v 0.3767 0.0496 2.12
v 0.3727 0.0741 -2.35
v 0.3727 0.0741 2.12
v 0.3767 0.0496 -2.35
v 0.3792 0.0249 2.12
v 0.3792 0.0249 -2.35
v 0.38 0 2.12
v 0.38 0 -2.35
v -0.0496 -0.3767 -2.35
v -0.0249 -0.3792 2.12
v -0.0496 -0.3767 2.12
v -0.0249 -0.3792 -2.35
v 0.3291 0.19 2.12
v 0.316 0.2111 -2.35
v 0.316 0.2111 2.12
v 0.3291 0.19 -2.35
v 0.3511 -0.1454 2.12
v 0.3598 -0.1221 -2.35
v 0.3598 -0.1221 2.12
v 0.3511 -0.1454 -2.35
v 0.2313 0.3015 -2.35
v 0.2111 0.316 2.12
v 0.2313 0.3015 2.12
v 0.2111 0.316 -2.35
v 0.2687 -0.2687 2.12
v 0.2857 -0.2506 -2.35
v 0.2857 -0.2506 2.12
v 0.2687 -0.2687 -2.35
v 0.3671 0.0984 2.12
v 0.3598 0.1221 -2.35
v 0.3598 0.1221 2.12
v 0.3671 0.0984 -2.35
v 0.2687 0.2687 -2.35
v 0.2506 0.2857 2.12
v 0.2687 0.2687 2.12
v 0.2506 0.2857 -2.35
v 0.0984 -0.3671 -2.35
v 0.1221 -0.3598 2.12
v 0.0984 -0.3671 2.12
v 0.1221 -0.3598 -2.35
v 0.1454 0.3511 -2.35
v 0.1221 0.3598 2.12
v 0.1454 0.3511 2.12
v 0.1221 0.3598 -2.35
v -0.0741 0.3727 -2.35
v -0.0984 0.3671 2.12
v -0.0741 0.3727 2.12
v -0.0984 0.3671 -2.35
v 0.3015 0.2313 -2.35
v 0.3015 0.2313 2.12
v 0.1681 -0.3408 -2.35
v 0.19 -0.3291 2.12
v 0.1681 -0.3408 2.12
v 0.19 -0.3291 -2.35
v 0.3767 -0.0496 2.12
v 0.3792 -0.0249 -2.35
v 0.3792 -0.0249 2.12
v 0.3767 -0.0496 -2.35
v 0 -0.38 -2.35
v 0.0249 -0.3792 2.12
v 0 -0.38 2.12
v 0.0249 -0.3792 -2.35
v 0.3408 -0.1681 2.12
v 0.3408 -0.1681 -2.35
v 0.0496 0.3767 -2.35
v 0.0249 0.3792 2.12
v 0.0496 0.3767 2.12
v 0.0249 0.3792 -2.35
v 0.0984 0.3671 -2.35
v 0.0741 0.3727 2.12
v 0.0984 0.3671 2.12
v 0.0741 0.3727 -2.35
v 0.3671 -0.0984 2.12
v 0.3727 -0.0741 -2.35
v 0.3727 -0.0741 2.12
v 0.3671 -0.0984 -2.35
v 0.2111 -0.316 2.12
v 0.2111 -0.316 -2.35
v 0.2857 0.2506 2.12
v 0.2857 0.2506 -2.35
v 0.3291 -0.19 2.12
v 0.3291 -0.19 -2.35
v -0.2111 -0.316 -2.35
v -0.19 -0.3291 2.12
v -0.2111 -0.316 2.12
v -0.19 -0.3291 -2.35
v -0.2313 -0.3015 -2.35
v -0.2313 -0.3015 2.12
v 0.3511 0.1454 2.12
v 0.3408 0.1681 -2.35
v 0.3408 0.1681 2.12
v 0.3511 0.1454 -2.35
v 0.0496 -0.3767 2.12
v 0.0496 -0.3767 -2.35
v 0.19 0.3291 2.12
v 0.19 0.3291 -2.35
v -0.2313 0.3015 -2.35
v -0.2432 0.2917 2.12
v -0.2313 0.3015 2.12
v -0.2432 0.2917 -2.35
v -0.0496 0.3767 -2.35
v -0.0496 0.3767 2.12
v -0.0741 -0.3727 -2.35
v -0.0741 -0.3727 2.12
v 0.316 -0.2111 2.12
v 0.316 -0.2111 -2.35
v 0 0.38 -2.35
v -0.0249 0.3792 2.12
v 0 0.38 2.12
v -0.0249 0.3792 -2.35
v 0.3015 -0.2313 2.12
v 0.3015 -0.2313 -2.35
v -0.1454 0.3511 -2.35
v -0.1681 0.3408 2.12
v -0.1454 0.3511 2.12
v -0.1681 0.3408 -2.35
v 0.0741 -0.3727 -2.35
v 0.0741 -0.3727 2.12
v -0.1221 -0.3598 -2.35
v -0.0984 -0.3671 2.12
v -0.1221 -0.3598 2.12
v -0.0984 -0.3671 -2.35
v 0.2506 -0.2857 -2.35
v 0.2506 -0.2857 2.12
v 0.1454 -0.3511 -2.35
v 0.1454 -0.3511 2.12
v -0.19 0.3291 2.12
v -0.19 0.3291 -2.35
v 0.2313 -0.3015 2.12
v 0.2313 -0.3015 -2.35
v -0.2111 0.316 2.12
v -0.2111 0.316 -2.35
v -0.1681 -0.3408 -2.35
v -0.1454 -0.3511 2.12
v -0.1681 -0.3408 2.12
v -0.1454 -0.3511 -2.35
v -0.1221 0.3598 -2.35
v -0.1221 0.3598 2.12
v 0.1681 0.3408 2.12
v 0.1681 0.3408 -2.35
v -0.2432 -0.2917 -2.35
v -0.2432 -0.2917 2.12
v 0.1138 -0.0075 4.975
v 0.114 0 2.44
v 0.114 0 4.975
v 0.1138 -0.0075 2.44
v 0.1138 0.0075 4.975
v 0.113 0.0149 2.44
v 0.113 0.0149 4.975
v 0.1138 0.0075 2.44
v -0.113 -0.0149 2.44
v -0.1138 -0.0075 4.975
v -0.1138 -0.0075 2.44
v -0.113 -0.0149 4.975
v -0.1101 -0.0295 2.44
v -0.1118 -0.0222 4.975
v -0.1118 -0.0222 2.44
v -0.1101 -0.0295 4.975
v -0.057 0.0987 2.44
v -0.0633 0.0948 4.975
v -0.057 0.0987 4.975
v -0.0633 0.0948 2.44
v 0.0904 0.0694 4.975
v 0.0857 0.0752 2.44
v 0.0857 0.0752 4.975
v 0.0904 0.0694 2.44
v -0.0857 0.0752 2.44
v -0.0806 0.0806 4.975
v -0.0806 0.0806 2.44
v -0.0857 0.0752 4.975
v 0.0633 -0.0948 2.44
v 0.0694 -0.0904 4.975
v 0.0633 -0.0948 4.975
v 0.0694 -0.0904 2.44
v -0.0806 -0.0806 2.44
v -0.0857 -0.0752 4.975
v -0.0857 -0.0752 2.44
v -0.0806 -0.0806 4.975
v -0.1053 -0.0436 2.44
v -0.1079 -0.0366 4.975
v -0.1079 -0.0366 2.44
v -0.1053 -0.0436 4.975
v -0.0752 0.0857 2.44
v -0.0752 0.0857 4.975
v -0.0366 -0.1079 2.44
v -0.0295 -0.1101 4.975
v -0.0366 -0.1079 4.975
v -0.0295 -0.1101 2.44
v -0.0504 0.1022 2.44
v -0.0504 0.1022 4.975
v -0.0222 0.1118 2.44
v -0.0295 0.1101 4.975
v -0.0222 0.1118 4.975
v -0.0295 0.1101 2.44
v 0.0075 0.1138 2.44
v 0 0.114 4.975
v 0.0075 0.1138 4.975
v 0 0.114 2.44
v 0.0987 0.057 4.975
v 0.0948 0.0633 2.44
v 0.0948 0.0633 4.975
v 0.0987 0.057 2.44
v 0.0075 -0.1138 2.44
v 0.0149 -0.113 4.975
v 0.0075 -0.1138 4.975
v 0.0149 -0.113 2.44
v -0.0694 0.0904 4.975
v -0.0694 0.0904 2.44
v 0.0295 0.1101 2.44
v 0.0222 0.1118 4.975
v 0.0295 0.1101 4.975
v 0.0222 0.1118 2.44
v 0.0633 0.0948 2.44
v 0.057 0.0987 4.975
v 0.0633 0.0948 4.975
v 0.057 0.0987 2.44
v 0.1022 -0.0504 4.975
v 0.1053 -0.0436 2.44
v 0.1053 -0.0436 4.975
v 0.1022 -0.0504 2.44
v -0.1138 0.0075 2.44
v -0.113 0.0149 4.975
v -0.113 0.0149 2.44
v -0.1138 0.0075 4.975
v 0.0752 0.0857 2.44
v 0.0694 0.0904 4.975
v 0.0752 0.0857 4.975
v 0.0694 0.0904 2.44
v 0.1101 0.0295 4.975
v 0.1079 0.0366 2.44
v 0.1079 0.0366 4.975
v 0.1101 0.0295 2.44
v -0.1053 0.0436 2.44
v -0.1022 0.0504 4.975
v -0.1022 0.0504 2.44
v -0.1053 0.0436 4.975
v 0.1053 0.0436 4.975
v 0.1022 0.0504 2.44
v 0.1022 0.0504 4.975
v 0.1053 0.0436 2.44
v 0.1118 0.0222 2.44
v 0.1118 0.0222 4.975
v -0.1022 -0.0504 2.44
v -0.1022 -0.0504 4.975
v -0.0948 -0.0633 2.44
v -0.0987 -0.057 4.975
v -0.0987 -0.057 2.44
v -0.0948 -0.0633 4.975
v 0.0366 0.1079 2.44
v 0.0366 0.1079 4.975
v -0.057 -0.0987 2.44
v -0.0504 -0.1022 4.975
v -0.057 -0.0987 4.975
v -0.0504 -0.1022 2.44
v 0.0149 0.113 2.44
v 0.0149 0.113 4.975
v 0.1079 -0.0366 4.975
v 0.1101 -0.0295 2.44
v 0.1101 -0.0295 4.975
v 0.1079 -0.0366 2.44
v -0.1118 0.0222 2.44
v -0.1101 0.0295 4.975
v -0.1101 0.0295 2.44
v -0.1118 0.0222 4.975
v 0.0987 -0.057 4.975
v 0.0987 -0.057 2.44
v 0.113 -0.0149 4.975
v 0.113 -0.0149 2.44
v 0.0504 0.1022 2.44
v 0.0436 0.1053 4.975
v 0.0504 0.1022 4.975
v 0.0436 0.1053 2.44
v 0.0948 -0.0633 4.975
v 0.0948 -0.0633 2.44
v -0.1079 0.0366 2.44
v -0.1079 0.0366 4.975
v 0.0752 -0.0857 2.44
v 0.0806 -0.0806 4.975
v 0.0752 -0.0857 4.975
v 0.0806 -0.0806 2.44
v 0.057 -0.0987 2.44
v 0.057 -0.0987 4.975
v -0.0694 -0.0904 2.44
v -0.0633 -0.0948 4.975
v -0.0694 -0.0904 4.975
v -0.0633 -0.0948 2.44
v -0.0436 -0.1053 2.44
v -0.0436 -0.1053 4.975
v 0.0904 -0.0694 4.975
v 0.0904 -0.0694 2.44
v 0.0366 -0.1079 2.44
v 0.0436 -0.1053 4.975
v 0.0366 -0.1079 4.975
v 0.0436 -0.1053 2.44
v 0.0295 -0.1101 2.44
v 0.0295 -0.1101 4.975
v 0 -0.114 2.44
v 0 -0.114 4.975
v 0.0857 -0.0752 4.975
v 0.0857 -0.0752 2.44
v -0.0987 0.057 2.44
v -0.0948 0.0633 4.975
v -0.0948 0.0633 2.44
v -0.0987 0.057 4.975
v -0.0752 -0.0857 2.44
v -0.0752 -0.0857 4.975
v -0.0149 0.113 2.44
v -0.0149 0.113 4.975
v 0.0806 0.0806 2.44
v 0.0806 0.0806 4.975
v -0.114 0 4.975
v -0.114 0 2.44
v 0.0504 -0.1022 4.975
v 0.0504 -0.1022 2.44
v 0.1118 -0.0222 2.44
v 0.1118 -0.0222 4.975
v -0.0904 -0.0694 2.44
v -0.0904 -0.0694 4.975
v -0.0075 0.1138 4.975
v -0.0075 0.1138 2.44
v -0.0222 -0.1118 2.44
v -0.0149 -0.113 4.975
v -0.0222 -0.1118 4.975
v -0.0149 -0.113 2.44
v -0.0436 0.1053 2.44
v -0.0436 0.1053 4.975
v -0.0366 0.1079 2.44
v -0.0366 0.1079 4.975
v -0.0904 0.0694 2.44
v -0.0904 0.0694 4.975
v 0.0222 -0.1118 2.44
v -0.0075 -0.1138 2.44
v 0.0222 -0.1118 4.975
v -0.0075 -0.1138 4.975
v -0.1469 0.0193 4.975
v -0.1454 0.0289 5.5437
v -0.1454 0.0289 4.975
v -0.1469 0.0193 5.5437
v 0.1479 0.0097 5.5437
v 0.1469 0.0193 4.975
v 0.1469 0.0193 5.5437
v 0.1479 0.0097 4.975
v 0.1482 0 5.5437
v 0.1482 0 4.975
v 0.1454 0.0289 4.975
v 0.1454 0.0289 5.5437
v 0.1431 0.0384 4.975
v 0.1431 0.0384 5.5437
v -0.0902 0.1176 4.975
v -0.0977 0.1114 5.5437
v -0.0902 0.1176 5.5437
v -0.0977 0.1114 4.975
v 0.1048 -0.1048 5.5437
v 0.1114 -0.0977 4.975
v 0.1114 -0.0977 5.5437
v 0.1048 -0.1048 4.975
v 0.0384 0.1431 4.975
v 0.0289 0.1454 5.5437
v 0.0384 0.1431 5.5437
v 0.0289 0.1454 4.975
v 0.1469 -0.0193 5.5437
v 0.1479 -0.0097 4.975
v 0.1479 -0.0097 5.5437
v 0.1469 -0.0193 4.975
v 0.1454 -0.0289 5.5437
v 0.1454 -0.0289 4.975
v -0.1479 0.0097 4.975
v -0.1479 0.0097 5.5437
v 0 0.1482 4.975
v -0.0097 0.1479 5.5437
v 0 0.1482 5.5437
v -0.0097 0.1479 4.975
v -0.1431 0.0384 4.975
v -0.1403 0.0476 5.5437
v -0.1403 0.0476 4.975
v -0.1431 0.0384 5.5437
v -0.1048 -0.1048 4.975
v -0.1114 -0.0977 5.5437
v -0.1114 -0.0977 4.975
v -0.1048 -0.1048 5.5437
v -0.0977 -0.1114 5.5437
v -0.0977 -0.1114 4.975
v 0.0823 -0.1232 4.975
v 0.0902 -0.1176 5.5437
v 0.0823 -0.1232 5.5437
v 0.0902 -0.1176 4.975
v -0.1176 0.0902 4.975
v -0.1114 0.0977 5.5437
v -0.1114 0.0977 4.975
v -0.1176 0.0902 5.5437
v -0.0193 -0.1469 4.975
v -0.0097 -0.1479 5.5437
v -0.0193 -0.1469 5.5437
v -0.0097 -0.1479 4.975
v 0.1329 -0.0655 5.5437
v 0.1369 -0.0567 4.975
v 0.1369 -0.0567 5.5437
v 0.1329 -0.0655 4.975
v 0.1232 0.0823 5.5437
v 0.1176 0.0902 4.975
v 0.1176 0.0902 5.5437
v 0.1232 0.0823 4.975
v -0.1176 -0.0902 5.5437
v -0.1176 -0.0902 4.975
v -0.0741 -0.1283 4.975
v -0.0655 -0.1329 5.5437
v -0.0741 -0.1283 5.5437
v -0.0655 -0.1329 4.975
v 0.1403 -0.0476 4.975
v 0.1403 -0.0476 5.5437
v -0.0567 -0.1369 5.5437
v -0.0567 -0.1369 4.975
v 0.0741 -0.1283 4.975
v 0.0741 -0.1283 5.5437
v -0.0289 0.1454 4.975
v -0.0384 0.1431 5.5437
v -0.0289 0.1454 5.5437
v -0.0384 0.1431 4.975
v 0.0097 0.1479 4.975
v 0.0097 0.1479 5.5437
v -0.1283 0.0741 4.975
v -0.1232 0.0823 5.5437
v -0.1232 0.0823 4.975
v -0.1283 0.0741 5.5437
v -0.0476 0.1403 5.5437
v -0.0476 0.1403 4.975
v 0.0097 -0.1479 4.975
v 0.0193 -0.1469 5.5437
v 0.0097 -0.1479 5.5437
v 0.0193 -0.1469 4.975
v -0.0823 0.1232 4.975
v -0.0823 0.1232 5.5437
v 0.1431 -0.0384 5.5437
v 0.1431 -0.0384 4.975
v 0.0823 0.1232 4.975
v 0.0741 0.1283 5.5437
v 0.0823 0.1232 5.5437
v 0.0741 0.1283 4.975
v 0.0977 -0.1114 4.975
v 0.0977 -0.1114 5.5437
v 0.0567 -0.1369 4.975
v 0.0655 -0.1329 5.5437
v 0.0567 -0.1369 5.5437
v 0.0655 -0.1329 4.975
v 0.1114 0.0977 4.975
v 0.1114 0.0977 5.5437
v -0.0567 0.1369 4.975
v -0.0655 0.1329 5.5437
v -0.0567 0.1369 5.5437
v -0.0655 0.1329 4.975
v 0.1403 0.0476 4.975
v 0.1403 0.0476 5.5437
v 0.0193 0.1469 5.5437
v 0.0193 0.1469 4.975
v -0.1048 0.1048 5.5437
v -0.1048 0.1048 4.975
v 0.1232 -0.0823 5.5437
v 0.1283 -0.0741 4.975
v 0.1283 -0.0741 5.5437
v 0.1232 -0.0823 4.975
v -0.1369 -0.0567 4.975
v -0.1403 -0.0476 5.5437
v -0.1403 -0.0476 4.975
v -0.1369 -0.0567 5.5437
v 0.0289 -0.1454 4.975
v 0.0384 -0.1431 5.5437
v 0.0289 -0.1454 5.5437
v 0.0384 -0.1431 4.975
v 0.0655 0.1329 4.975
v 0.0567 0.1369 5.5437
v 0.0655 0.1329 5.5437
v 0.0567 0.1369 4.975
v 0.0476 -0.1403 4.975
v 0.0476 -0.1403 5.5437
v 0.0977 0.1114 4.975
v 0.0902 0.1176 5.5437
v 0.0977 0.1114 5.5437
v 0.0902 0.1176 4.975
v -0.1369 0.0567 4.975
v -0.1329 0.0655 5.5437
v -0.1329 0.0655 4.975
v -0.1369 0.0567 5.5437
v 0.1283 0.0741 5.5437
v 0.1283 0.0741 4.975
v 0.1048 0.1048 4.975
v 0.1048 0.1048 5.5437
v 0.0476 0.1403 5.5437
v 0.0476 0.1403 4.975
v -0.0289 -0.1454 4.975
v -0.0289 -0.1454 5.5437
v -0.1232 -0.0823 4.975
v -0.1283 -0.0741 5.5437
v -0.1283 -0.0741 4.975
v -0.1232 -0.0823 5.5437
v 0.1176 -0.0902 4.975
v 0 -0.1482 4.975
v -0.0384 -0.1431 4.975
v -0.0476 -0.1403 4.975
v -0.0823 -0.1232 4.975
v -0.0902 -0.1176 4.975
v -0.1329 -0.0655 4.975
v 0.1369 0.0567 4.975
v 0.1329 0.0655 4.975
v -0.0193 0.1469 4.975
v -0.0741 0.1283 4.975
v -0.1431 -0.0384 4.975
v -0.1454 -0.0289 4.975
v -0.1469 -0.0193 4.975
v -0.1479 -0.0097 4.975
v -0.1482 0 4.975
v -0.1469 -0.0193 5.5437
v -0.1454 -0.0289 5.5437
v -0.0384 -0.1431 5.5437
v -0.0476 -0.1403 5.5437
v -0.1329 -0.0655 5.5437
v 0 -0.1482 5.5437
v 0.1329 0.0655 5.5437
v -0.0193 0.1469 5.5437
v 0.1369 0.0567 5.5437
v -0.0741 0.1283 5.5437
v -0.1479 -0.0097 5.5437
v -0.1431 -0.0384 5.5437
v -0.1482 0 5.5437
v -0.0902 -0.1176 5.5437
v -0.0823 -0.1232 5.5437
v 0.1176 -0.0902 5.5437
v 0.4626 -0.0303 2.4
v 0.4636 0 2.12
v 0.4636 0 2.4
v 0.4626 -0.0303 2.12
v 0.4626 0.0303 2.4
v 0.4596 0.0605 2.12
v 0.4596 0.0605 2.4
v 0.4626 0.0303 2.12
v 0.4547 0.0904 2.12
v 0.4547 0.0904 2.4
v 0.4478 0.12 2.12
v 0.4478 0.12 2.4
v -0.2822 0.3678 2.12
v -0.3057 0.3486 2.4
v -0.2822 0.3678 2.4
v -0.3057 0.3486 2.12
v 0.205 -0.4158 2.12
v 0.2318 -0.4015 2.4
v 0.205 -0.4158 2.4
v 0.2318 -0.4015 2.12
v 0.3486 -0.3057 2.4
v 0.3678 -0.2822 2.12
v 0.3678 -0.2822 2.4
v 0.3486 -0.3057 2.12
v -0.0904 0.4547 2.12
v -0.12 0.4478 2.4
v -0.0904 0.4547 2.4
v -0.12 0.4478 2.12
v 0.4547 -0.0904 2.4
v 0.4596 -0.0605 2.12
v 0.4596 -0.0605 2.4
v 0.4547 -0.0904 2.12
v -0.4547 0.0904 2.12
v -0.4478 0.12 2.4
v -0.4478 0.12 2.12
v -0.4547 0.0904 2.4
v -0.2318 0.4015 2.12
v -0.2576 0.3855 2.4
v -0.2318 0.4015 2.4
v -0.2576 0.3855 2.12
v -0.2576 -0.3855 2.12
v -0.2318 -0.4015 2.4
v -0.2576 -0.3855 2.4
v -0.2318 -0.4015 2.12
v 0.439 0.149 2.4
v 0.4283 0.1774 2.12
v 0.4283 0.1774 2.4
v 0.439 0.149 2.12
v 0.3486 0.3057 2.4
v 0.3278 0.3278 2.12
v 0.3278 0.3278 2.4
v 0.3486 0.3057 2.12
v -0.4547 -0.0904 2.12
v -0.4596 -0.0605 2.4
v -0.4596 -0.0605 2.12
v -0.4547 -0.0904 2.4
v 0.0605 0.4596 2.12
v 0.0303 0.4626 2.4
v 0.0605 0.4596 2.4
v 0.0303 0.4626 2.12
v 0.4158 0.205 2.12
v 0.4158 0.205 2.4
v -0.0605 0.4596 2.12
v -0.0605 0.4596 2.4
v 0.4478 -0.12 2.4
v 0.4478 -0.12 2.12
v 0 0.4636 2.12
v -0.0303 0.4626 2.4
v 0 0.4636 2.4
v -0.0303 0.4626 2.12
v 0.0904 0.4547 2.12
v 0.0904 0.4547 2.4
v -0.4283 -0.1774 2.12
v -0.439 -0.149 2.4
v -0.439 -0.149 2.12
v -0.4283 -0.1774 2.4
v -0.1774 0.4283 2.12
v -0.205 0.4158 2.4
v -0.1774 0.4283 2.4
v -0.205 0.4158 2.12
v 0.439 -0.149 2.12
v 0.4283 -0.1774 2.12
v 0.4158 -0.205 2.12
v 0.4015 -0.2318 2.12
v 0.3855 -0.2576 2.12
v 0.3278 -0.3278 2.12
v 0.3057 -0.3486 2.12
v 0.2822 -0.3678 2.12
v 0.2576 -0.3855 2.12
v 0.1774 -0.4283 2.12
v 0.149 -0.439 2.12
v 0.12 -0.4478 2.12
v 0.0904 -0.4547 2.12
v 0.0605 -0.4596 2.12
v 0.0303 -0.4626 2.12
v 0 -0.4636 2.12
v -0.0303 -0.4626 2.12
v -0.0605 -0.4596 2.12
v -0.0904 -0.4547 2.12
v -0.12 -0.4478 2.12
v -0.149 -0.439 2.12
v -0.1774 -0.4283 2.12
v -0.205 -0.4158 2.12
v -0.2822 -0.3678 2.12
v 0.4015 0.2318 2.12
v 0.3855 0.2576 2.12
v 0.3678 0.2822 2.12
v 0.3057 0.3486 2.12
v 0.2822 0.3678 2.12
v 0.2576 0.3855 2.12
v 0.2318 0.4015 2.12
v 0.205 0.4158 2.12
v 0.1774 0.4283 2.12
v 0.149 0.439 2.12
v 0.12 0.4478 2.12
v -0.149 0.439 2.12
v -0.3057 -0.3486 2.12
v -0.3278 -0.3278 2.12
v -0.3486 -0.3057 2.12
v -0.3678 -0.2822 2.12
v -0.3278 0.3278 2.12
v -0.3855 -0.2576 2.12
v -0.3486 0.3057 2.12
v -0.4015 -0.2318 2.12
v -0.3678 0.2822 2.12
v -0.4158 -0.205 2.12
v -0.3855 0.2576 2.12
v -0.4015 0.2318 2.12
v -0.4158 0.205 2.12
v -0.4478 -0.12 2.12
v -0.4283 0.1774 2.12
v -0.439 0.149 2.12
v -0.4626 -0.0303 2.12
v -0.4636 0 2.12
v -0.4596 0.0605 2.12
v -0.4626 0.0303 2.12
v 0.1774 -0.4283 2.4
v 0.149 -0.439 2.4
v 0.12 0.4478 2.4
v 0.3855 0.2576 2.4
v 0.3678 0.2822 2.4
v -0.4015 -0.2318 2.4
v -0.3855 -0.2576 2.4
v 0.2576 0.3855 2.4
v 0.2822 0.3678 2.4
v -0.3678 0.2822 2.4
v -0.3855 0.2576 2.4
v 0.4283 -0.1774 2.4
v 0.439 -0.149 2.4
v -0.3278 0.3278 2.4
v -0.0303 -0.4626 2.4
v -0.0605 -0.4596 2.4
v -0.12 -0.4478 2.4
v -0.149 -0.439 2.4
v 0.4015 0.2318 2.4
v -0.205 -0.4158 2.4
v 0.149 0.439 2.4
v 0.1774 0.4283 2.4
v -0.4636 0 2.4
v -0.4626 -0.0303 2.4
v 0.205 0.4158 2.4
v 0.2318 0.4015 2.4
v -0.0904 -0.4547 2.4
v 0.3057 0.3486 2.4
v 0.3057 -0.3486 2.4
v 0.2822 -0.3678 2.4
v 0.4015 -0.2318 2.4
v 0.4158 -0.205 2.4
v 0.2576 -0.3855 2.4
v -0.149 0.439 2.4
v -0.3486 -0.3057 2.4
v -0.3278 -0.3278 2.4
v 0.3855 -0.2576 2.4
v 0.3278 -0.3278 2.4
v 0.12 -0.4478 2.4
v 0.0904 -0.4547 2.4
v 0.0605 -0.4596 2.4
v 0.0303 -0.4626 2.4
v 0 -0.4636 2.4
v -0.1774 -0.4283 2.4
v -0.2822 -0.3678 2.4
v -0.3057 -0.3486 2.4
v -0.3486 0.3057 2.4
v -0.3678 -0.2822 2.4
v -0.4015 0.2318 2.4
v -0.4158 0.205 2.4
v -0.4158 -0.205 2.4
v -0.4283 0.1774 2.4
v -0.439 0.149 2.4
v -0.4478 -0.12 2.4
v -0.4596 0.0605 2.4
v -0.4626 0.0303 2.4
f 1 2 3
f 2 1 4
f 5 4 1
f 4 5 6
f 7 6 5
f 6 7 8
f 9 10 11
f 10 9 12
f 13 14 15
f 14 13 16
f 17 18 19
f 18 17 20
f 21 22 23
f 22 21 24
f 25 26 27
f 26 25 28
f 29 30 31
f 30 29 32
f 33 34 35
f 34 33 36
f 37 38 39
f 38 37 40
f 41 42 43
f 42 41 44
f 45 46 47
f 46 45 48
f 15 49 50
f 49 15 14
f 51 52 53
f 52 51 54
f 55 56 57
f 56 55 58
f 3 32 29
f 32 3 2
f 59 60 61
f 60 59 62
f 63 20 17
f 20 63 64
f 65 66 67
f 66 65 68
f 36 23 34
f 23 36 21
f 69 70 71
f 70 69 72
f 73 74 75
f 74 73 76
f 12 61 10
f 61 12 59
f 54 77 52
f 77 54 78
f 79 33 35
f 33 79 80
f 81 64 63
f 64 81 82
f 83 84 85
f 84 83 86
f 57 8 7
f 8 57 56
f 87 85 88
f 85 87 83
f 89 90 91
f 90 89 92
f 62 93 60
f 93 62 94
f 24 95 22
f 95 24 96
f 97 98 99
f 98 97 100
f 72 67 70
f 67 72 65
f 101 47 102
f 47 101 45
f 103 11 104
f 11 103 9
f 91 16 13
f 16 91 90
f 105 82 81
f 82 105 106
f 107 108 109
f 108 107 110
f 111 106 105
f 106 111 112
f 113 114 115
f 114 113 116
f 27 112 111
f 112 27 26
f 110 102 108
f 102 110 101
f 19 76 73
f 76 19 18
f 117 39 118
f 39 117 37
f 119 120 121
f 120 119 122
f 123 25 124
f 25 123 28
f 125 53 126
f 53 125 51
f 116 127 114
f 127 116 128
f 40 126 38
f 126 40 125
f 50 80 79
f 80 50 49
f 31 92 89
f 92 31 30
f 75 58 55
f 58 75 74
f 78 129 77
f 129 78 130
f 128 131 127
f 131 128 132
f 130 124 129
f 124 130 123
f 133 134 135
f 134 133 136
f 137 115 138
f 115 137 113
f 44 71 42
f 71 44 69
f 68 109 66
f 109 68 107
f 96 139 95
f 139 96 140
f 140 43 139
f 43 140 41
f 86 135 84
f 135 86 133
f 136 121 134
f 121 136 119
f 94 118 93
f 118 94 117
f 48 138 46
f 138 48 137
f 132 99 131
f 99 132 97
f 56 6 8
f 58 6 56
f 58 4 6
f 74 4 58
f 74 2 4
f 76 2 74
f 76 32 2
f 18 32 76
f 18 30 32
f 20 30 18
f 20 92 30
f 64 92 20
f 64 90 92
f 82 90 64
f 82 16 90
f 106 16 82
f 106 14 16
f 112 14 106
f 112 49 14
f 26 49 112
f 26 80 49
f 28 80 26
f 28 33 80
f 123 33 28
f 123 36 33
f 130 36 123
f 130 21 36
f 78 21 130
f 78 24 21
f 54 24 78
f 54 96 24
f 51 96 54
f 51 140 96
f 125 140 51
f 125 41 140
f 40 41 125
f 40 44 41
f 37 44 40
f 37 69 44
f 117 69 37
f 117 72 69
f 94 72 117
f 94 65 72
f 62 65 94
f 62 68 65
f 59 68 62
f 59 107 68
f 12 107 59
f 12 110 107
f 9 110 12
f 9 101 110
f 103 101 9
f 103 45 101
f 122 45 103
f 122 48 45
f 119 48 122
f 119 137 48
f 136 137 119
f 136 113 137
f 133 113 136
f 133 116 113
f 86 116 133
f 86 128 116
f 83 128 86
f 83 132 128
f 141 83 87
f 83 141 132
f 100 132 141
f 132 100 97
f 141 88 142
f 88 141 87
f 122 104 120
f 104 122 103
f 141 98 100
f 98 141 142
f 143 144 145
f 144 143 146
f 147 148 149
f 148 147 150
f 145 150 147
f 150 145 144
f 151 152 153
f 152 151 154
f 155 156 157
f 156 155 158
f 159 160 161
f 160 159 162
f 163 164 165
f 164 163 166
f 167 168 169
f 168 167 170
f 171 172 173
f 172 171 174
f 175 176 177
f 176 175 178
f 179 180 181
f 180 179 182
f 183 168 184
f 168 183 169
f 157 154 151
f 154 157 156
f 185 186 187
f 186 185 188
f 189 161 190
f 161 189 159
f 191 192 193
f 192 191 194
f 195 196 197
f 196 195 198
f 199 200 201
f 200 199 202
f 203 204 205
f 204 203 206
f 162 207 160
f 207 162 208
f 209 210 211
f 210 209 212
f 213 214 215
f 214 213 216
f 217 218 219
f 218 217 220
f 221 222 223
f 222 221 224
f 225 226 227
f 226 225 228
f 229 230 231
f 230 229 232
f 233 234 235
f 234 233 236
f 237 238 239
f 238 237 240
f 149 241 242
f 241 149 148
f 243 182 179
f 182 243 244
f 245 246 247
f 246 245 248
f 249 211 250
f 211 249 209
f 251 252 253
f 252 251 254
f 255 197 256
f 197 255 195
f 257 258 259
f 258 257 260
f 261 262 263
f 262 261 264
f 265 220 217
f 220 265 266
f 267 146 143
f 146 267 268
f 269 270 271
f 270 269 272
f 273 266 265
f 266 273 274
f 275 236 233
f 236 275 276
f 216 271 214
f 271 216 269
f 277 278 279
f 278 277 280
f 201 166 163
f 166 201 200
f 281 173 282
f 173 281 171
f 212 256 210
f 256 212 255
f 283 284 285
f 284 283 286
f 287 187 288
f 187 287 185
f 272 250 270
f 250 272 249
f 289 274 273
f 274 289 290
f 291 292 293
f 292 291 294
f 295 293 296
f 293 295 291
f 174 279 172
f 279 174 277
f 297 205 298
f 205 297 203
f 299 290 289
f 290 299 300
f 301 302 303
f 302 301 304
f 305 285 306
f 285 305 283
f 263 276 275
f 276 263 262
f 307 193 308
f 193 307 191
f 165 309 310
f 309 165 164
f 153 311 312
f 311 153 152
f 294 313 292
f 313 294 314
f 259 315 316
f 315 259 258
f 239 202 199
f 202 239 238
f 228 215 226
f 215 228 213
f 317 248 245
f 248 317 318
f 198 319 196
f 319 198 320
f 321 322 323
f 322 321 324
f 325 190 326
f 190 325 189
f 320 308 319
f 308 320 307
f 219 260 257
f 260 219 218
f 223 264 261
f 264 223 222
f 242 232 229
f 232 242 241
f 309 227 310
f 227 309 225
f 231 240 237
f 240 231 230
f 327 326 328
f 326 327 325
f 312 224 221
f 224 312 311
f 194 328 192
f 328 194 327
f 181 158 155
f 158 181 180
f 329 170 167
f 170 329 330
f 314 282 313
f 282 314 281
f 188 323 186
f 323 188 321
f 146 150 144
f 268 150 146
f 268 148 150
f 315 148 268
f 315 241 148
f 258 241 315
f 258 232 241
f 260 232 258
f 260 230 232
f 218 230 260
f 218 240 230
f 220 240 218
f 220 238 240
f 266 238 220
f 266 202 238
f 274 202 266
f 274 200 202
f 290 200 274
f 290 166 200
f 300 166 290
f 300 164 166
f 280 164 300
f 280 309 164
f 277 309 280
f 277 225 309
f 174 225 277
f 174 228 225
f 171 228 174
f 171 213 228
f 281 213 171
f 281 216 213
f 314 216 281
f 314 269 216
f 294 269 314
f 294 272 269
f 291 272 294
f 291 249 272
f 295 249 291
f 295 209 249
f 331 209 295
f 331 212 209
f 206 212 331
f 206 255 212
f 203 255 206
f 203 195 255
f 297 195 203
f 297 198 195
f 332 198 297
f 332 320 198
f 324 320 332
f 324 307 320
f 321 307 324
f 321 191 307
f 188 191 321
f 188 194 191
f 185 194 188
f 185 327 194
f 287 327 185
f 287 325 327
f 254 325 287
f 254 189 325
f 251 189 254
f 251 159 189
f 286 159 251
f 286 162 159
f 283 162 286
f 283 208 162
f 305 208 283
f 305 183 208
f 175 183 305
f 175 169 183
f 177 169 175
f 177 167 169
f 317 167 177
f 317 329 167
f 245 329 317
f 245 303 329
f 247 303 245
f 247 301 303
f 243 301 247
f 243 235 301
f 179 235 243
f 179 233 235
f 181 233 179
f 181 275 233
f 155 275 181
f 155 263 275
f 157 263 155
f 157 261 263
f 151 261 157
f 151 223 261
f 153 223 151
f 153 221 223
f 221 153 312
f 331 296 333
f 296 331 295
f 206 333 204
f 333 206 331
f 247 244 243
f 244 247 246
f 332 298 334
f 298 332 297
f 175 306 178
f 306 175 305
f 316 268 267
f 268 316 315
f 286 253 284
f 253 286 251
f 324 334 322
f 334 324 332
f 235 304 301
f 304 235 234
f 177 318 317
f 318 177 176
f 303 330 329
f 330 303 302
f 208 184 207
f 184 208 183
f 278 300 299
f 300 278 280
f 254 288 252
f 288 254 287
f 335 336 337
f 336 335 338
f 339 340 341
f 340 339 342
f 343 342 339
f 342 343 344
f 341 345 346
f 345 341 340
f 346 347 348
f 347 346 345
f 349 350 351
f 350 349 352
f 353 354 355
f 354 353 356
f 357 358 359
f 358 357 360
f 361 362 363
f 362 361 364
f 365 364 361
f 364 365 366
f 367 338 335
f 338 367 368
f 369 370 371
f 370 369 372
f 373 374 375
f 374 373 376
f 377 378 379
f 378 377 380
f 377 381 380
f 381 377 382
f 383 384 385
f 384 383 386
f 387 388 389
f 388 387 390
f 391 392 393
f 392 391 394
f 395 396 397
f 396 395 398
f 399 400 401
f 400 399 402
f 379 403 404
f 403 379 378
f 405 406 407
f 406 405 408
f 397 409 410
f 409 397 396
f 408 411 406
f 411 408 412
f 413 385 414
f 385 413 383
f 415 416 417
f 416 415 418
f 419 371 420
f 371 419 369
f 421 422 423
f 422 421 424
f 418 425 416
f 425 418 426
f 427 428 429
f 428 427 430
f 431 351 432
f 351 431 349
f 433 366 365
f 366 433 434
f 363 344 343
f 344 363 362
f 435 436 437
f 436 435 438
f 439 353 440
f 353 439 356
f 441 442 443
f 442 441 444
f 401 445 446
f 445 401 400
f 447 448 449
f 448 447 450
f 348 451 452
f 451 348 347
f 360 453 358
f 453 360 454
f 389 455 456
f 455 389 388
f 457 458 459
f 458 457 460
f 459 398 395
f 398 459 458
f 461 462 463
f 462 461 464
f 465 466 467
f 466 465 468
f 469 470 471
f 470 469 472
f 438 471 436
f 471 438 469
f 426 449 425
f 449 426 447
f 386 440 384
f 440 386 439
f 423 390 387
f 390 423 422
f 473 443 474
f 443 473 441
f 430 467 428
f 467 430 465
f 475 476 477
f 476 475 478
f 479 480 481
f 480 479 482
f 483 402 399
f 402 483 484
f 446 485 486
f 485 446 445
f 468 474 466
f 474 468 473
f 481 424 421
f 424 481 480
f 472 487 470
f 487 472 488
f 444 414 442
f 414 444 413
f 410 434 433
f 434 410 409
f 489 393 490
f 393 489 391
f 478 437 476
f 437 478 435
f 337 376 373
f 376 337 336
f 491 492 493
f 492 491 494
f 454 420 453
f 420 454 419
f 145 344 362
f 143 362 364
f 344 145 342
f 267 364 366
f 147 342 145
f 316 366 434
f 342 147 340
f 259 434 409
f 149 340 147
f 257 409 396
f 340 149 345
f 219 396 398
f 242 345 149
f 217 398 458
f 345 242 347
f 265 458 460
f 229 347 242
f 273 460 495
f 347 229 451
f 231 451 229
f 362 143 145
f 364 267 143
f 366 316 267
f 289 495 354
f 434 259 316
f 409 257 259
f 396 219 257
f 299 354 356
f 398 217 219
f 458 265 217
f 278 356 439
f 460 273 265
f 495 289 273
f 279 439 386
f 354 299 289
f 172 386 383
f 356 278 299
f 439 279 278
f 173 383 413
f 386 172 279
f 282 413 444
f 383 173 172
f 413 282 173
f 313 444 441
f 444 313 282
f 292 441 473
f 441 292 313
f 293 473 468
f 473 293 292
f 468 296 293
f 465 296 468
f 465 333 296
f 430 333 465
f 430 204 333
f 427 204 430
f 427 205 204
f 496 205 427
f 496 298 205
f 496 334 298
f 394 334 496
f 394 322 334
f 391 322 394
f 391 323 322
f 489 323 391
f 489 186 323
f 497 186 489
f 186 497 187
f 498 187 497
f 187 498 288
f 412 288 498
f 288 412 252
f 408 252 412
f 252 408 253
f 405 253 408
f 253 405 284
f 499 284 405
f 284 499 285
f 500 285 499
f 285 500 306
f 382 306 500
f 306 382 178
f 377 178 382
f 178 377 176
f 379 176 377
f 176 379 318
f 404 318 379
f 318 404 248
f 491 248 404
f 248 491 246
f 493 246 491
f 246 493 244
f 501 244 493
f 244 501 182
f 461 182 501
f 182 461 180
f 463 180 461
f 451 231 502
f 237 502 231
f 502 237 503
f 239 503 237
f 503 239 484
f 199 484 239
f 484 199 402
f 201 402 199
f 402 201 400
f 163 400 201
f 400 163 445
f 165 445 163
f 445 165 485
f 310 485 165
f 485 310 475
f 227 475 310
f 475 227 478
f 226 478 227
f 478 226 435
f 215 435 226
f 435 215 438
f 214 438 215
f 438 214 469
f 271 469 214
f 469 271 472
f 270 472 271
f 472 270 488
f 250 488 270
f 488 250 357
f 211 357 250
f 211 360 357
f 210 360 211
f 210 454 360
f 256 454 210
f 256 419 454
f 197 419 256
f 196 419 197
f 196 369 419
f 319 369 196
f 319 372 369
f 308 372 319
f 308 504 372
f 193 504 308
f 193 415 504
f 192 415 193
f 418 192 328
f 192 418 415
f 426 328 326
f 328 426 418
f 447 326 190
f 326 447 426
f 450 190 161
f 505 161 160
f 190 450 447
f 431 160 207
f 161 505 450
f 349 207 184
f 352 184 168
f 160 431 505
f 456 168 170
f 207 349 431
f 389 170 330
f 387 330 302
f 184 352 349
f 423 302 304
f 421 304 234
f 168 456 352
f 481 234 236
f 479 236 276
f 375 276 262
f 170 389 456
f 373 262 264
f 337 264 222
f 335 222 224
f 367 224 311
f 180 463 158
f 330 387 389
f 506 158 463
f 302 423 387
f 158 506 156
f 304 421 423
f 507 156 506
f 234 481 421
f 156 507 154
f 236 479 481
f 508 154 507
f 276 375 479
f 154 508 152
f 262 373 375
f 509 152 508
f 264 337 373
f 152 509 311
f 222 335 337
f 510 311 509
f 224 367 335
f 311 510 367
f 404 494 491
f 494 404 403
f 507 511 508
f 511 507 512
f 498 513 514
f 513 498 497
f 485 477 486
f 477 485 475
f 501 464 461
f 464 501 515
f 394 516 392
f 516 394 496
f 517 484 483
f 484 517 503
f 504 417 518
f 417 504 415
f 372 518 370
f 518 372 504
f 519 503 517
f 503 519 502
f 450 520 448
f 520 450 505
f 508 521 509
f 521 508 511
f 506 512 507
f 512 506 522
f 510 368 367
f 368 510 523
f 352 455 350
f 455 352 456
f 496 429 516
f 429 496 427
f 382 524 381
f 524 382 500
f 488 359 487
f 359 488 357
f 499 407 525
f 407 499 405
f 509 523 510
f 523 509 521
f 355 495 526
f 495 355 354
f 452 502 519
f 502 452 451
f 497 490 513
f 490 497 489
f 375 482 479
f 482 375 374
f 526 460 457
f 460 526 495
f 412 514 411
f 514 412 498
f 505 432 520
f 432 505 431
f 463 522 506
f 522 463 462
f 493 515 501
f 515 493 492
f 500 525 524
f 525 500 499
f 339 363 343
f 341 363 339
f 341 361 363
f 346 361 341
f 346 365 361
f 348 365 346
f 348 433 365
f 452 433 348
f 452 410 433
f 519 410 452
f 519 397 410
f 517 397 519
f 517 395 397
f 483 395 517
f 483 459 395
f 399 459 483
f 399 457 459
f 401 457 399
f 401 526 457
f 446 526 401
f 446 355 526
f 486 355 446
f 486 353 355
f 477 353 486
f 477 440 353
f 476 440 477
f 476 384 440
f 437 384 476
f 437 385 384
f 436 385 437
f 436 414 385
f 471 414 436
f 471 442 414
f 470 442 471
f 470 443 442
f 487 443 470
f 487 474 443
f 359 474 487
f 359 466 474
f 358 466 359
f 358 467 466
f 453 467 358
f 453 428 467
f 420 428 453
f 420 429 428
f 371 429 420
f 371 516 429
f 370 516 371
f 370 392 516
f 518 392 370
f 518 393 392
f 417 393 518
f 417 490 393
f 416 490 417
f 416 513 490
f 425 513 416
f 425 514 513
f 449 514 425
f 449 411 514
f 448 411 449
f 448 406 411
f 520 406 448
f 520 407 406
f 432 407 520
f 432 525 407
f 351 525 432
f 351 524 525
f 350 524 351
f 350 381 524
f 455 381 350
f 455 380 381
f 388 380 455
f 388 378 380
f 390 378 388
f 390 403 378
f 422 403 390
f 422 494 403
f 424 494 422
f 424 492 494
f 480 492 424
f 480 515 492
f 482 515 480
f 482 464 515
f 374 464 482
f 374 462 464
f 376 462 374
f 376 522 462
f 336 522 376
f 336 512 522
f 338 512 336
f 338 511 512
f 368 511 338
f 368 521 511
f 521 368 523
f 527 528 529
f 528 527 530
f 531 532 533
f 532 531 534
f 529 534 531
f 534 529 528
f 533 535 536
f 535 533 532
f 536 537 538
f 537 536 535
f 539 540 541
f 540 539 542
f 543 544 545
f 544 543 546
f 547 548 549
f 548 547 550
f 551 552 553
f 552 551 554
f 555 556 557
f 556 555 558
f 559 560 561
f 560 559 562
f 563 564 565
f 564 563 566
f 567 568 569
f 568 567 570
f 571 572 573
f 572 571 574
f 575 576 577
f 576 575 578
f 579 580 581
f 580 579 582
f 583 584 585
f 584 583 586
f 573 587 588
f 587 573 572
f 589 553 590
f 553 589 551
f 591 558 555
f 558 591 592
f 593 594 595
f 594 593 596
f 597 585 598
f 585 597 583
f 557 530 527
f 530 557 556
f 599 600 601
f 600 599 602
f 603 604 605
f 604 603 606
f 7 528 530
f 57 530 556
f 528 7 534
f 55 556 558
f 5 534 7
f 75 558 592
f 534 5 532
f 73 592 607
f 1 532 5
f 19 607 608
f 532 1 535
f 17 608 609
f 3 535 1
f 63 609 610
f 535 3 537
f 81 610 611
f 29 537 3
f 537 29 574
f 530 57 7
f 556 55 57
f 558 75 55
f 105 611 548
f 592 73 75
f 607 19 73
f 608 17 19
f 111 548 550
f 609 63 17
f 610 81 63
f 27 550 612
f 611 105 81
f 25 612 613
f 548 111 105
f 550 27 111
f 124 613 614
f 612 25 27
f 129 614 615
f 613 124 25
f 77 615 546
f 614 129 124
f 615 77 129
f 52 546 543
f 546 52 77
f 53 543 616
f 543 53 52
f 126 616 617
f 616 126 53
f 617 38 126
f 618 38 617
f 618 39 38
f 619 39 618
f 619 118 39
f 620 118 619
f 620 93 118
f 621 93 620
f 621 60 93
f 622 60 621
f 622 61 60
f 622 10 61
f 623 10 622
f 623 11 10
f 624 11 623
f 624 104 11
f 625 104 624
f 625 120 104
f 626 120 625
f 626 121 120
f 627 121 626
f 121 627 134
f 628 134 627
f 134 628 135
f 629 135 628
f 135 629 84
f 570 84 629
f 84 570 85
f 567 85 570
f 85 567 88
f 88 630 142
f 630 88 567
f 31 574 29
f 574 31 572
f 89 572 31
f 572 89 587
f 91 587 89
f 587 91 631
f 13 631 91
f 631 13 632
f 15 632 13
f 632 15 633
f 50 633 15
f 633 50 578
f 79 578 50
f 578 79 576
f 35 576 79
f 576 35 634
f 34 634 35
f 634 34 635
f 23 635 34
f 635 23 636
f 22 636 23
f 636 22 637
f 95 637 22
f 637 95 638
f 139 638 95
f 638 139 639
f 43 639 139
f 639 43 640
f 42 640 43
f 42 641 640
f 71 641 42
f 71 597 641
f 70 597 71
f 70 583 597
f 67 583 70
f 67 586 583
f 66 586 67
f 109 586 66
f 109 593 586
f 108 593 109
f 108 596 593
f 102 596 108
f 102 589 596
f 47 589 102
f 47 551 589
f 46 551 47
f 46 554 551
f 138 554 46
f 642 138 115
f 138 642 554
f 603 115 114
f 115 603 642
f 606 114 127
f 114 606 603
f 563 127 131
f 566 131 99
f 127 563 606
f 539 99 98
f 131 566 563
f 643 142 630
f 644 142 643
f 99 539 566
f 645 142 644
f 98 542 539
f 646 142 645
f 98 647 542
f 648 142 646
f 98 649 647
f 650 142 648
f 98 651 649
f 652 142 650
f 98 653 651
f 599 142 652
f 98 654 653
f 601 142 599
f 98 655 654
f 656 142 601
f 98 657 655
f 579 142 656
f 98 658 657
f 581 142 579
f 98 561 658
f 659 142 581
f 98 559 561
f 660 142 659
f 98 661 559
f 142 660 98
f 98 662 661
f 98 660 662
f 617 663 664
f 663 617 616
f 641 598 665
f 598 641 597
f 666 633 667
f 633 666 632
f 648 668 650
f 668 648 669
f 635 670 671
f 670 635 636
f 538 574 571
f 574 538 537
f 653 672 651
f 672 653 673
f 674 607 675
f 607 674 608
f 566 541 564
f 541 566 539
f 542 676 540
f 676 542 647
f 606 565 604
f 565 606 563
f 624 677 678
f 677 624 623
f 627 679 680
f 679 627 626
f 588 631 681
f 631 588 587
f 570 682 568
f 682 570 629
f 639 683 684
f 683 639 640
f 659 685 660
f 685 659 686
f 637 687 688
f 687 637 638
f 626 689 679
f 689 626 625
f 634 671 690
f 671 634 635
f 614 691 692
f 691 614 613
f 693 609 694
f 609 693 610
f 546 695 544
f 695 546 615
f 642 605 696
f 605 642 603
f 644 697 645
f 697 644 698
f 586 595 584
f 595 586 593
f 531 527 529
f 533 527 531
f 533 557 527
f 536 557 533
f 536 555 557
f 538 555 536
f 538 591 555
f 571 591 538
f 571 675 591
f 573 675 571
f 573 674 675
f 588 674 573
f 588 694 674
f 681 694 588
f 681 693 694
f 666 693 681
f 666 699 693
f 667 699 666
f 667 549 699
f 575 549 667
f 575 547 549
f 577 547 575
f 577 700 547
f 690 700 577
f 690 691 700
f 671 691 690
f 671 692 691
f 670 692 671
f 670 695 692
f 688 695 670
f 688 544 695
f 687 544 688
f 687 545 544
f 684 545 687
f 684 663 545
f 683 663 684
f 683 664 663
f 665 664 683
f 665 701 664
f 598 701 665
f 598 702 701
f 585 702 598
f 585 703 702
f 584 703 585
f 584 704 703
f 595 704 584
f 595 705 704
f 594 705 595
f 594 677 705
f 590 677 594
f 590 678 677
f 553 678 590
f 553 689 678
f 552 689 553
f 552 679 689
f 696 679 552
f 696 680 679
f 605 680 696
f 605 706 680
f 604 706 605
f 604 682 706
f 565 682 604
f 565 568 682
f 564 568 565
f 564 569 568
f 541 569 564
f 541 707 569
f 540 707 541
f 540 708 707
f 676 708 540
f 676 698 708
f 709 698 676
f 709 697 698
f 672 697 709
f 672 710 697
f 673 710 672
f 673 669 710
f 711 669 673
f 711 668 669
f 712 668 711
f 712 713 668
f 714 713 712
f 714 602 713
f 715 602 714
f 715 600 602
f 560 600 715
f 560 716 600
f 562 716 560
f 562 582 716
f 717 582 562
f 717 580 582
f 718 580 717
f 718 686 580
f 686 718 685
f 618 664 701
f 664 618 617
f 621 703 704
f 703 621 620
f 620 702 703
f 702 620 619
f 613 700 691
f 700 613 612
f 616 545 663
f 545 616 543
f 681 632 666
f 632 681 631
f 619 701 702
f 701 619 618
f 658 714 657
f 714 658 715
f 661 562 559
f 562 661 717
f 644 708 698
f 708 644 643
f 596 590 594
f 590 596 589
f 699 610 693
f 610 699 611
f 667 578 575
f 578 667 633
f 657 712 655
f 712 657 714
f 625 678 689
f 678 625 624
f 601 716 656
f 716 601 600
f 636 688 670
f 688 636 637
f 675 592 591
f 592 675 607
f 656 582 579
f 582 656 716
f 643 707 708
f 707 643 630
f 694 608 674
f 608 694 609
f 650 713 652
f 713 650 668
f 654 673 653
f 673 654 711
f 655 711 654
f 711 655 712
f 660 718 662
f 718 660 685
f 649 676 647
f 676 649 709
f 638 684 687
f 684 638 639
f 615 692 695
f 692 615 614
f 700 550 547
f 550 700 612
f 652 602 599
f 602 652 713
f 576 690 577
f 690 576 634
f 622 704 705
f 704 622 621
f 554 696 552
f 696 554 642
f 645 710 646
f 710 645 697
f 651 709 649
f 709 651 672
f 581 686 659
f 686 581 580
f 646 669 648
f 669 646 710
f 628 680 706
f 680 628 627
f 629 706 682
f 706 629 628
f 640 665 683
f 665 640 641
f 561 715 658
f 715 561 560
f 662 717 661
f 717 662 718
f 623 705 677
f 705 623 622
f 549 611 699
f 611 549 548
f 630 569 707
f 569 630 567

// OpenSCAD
$fn = 96;

// Target overall dimensions (BODY ONLY)
body_d = 0.76;   // mm (max diameter of body housing)
body_h = 4.7;    // mm (height of body housing)

// Visible toggle details (kept small but readable)
collar_h = 0.28;
collar_d = body_d * 1.22;

lever_d = body_d * 0.30;
lever_h = body_h * 0.55;

tip_d = lever_d * 1.30;
tip_h = lever_h * 0.22;

// Small overlap to guarantee a single connected solid
overlap = 0.05;

// Subtle housing facet so orthographic views read as "toggle switch" not just a dot
housing_flat = body_d * 0.18;

module body_housing() {
    // Body stays within body_d envelope
    intersection() {
        cylinder(d = body_d, h = body_h, center = true);
        // Create a flat by intersecting with a slightly offset cube
        translate([housing_flat, 0, 0])
            cube([body_d, body_d * 1.35, body_h + 2], center = true);
    }
}

module collar() {
    // Collar sits on top of body and overlaps slightly into it
    translate([0, 0, body_h/2 - collar_h/2 + overlap])
        cylinder(d = collar_d, h = collar_h, center = true);
}

module lever_and_tip() {
    // Lever starts inside collar to ensure connectivity
    lever_base_z = body_h/2 + collar_h/2 - overlap;

    translate([0, 0, lever_base_z])
        cylinder(d = lever_d, h = lever_h, center = false);

    // Tip overlaps into lever
    translate([0, 0, lever_base_z + lever_h - overlap])
        cylinder(d = tip_d, h = tip_h, center = false);
}

module toggle_switch() {
    union() {
        body_housing();
        collar();
        lever_and_tip();
    }
}

toggle_switch();
